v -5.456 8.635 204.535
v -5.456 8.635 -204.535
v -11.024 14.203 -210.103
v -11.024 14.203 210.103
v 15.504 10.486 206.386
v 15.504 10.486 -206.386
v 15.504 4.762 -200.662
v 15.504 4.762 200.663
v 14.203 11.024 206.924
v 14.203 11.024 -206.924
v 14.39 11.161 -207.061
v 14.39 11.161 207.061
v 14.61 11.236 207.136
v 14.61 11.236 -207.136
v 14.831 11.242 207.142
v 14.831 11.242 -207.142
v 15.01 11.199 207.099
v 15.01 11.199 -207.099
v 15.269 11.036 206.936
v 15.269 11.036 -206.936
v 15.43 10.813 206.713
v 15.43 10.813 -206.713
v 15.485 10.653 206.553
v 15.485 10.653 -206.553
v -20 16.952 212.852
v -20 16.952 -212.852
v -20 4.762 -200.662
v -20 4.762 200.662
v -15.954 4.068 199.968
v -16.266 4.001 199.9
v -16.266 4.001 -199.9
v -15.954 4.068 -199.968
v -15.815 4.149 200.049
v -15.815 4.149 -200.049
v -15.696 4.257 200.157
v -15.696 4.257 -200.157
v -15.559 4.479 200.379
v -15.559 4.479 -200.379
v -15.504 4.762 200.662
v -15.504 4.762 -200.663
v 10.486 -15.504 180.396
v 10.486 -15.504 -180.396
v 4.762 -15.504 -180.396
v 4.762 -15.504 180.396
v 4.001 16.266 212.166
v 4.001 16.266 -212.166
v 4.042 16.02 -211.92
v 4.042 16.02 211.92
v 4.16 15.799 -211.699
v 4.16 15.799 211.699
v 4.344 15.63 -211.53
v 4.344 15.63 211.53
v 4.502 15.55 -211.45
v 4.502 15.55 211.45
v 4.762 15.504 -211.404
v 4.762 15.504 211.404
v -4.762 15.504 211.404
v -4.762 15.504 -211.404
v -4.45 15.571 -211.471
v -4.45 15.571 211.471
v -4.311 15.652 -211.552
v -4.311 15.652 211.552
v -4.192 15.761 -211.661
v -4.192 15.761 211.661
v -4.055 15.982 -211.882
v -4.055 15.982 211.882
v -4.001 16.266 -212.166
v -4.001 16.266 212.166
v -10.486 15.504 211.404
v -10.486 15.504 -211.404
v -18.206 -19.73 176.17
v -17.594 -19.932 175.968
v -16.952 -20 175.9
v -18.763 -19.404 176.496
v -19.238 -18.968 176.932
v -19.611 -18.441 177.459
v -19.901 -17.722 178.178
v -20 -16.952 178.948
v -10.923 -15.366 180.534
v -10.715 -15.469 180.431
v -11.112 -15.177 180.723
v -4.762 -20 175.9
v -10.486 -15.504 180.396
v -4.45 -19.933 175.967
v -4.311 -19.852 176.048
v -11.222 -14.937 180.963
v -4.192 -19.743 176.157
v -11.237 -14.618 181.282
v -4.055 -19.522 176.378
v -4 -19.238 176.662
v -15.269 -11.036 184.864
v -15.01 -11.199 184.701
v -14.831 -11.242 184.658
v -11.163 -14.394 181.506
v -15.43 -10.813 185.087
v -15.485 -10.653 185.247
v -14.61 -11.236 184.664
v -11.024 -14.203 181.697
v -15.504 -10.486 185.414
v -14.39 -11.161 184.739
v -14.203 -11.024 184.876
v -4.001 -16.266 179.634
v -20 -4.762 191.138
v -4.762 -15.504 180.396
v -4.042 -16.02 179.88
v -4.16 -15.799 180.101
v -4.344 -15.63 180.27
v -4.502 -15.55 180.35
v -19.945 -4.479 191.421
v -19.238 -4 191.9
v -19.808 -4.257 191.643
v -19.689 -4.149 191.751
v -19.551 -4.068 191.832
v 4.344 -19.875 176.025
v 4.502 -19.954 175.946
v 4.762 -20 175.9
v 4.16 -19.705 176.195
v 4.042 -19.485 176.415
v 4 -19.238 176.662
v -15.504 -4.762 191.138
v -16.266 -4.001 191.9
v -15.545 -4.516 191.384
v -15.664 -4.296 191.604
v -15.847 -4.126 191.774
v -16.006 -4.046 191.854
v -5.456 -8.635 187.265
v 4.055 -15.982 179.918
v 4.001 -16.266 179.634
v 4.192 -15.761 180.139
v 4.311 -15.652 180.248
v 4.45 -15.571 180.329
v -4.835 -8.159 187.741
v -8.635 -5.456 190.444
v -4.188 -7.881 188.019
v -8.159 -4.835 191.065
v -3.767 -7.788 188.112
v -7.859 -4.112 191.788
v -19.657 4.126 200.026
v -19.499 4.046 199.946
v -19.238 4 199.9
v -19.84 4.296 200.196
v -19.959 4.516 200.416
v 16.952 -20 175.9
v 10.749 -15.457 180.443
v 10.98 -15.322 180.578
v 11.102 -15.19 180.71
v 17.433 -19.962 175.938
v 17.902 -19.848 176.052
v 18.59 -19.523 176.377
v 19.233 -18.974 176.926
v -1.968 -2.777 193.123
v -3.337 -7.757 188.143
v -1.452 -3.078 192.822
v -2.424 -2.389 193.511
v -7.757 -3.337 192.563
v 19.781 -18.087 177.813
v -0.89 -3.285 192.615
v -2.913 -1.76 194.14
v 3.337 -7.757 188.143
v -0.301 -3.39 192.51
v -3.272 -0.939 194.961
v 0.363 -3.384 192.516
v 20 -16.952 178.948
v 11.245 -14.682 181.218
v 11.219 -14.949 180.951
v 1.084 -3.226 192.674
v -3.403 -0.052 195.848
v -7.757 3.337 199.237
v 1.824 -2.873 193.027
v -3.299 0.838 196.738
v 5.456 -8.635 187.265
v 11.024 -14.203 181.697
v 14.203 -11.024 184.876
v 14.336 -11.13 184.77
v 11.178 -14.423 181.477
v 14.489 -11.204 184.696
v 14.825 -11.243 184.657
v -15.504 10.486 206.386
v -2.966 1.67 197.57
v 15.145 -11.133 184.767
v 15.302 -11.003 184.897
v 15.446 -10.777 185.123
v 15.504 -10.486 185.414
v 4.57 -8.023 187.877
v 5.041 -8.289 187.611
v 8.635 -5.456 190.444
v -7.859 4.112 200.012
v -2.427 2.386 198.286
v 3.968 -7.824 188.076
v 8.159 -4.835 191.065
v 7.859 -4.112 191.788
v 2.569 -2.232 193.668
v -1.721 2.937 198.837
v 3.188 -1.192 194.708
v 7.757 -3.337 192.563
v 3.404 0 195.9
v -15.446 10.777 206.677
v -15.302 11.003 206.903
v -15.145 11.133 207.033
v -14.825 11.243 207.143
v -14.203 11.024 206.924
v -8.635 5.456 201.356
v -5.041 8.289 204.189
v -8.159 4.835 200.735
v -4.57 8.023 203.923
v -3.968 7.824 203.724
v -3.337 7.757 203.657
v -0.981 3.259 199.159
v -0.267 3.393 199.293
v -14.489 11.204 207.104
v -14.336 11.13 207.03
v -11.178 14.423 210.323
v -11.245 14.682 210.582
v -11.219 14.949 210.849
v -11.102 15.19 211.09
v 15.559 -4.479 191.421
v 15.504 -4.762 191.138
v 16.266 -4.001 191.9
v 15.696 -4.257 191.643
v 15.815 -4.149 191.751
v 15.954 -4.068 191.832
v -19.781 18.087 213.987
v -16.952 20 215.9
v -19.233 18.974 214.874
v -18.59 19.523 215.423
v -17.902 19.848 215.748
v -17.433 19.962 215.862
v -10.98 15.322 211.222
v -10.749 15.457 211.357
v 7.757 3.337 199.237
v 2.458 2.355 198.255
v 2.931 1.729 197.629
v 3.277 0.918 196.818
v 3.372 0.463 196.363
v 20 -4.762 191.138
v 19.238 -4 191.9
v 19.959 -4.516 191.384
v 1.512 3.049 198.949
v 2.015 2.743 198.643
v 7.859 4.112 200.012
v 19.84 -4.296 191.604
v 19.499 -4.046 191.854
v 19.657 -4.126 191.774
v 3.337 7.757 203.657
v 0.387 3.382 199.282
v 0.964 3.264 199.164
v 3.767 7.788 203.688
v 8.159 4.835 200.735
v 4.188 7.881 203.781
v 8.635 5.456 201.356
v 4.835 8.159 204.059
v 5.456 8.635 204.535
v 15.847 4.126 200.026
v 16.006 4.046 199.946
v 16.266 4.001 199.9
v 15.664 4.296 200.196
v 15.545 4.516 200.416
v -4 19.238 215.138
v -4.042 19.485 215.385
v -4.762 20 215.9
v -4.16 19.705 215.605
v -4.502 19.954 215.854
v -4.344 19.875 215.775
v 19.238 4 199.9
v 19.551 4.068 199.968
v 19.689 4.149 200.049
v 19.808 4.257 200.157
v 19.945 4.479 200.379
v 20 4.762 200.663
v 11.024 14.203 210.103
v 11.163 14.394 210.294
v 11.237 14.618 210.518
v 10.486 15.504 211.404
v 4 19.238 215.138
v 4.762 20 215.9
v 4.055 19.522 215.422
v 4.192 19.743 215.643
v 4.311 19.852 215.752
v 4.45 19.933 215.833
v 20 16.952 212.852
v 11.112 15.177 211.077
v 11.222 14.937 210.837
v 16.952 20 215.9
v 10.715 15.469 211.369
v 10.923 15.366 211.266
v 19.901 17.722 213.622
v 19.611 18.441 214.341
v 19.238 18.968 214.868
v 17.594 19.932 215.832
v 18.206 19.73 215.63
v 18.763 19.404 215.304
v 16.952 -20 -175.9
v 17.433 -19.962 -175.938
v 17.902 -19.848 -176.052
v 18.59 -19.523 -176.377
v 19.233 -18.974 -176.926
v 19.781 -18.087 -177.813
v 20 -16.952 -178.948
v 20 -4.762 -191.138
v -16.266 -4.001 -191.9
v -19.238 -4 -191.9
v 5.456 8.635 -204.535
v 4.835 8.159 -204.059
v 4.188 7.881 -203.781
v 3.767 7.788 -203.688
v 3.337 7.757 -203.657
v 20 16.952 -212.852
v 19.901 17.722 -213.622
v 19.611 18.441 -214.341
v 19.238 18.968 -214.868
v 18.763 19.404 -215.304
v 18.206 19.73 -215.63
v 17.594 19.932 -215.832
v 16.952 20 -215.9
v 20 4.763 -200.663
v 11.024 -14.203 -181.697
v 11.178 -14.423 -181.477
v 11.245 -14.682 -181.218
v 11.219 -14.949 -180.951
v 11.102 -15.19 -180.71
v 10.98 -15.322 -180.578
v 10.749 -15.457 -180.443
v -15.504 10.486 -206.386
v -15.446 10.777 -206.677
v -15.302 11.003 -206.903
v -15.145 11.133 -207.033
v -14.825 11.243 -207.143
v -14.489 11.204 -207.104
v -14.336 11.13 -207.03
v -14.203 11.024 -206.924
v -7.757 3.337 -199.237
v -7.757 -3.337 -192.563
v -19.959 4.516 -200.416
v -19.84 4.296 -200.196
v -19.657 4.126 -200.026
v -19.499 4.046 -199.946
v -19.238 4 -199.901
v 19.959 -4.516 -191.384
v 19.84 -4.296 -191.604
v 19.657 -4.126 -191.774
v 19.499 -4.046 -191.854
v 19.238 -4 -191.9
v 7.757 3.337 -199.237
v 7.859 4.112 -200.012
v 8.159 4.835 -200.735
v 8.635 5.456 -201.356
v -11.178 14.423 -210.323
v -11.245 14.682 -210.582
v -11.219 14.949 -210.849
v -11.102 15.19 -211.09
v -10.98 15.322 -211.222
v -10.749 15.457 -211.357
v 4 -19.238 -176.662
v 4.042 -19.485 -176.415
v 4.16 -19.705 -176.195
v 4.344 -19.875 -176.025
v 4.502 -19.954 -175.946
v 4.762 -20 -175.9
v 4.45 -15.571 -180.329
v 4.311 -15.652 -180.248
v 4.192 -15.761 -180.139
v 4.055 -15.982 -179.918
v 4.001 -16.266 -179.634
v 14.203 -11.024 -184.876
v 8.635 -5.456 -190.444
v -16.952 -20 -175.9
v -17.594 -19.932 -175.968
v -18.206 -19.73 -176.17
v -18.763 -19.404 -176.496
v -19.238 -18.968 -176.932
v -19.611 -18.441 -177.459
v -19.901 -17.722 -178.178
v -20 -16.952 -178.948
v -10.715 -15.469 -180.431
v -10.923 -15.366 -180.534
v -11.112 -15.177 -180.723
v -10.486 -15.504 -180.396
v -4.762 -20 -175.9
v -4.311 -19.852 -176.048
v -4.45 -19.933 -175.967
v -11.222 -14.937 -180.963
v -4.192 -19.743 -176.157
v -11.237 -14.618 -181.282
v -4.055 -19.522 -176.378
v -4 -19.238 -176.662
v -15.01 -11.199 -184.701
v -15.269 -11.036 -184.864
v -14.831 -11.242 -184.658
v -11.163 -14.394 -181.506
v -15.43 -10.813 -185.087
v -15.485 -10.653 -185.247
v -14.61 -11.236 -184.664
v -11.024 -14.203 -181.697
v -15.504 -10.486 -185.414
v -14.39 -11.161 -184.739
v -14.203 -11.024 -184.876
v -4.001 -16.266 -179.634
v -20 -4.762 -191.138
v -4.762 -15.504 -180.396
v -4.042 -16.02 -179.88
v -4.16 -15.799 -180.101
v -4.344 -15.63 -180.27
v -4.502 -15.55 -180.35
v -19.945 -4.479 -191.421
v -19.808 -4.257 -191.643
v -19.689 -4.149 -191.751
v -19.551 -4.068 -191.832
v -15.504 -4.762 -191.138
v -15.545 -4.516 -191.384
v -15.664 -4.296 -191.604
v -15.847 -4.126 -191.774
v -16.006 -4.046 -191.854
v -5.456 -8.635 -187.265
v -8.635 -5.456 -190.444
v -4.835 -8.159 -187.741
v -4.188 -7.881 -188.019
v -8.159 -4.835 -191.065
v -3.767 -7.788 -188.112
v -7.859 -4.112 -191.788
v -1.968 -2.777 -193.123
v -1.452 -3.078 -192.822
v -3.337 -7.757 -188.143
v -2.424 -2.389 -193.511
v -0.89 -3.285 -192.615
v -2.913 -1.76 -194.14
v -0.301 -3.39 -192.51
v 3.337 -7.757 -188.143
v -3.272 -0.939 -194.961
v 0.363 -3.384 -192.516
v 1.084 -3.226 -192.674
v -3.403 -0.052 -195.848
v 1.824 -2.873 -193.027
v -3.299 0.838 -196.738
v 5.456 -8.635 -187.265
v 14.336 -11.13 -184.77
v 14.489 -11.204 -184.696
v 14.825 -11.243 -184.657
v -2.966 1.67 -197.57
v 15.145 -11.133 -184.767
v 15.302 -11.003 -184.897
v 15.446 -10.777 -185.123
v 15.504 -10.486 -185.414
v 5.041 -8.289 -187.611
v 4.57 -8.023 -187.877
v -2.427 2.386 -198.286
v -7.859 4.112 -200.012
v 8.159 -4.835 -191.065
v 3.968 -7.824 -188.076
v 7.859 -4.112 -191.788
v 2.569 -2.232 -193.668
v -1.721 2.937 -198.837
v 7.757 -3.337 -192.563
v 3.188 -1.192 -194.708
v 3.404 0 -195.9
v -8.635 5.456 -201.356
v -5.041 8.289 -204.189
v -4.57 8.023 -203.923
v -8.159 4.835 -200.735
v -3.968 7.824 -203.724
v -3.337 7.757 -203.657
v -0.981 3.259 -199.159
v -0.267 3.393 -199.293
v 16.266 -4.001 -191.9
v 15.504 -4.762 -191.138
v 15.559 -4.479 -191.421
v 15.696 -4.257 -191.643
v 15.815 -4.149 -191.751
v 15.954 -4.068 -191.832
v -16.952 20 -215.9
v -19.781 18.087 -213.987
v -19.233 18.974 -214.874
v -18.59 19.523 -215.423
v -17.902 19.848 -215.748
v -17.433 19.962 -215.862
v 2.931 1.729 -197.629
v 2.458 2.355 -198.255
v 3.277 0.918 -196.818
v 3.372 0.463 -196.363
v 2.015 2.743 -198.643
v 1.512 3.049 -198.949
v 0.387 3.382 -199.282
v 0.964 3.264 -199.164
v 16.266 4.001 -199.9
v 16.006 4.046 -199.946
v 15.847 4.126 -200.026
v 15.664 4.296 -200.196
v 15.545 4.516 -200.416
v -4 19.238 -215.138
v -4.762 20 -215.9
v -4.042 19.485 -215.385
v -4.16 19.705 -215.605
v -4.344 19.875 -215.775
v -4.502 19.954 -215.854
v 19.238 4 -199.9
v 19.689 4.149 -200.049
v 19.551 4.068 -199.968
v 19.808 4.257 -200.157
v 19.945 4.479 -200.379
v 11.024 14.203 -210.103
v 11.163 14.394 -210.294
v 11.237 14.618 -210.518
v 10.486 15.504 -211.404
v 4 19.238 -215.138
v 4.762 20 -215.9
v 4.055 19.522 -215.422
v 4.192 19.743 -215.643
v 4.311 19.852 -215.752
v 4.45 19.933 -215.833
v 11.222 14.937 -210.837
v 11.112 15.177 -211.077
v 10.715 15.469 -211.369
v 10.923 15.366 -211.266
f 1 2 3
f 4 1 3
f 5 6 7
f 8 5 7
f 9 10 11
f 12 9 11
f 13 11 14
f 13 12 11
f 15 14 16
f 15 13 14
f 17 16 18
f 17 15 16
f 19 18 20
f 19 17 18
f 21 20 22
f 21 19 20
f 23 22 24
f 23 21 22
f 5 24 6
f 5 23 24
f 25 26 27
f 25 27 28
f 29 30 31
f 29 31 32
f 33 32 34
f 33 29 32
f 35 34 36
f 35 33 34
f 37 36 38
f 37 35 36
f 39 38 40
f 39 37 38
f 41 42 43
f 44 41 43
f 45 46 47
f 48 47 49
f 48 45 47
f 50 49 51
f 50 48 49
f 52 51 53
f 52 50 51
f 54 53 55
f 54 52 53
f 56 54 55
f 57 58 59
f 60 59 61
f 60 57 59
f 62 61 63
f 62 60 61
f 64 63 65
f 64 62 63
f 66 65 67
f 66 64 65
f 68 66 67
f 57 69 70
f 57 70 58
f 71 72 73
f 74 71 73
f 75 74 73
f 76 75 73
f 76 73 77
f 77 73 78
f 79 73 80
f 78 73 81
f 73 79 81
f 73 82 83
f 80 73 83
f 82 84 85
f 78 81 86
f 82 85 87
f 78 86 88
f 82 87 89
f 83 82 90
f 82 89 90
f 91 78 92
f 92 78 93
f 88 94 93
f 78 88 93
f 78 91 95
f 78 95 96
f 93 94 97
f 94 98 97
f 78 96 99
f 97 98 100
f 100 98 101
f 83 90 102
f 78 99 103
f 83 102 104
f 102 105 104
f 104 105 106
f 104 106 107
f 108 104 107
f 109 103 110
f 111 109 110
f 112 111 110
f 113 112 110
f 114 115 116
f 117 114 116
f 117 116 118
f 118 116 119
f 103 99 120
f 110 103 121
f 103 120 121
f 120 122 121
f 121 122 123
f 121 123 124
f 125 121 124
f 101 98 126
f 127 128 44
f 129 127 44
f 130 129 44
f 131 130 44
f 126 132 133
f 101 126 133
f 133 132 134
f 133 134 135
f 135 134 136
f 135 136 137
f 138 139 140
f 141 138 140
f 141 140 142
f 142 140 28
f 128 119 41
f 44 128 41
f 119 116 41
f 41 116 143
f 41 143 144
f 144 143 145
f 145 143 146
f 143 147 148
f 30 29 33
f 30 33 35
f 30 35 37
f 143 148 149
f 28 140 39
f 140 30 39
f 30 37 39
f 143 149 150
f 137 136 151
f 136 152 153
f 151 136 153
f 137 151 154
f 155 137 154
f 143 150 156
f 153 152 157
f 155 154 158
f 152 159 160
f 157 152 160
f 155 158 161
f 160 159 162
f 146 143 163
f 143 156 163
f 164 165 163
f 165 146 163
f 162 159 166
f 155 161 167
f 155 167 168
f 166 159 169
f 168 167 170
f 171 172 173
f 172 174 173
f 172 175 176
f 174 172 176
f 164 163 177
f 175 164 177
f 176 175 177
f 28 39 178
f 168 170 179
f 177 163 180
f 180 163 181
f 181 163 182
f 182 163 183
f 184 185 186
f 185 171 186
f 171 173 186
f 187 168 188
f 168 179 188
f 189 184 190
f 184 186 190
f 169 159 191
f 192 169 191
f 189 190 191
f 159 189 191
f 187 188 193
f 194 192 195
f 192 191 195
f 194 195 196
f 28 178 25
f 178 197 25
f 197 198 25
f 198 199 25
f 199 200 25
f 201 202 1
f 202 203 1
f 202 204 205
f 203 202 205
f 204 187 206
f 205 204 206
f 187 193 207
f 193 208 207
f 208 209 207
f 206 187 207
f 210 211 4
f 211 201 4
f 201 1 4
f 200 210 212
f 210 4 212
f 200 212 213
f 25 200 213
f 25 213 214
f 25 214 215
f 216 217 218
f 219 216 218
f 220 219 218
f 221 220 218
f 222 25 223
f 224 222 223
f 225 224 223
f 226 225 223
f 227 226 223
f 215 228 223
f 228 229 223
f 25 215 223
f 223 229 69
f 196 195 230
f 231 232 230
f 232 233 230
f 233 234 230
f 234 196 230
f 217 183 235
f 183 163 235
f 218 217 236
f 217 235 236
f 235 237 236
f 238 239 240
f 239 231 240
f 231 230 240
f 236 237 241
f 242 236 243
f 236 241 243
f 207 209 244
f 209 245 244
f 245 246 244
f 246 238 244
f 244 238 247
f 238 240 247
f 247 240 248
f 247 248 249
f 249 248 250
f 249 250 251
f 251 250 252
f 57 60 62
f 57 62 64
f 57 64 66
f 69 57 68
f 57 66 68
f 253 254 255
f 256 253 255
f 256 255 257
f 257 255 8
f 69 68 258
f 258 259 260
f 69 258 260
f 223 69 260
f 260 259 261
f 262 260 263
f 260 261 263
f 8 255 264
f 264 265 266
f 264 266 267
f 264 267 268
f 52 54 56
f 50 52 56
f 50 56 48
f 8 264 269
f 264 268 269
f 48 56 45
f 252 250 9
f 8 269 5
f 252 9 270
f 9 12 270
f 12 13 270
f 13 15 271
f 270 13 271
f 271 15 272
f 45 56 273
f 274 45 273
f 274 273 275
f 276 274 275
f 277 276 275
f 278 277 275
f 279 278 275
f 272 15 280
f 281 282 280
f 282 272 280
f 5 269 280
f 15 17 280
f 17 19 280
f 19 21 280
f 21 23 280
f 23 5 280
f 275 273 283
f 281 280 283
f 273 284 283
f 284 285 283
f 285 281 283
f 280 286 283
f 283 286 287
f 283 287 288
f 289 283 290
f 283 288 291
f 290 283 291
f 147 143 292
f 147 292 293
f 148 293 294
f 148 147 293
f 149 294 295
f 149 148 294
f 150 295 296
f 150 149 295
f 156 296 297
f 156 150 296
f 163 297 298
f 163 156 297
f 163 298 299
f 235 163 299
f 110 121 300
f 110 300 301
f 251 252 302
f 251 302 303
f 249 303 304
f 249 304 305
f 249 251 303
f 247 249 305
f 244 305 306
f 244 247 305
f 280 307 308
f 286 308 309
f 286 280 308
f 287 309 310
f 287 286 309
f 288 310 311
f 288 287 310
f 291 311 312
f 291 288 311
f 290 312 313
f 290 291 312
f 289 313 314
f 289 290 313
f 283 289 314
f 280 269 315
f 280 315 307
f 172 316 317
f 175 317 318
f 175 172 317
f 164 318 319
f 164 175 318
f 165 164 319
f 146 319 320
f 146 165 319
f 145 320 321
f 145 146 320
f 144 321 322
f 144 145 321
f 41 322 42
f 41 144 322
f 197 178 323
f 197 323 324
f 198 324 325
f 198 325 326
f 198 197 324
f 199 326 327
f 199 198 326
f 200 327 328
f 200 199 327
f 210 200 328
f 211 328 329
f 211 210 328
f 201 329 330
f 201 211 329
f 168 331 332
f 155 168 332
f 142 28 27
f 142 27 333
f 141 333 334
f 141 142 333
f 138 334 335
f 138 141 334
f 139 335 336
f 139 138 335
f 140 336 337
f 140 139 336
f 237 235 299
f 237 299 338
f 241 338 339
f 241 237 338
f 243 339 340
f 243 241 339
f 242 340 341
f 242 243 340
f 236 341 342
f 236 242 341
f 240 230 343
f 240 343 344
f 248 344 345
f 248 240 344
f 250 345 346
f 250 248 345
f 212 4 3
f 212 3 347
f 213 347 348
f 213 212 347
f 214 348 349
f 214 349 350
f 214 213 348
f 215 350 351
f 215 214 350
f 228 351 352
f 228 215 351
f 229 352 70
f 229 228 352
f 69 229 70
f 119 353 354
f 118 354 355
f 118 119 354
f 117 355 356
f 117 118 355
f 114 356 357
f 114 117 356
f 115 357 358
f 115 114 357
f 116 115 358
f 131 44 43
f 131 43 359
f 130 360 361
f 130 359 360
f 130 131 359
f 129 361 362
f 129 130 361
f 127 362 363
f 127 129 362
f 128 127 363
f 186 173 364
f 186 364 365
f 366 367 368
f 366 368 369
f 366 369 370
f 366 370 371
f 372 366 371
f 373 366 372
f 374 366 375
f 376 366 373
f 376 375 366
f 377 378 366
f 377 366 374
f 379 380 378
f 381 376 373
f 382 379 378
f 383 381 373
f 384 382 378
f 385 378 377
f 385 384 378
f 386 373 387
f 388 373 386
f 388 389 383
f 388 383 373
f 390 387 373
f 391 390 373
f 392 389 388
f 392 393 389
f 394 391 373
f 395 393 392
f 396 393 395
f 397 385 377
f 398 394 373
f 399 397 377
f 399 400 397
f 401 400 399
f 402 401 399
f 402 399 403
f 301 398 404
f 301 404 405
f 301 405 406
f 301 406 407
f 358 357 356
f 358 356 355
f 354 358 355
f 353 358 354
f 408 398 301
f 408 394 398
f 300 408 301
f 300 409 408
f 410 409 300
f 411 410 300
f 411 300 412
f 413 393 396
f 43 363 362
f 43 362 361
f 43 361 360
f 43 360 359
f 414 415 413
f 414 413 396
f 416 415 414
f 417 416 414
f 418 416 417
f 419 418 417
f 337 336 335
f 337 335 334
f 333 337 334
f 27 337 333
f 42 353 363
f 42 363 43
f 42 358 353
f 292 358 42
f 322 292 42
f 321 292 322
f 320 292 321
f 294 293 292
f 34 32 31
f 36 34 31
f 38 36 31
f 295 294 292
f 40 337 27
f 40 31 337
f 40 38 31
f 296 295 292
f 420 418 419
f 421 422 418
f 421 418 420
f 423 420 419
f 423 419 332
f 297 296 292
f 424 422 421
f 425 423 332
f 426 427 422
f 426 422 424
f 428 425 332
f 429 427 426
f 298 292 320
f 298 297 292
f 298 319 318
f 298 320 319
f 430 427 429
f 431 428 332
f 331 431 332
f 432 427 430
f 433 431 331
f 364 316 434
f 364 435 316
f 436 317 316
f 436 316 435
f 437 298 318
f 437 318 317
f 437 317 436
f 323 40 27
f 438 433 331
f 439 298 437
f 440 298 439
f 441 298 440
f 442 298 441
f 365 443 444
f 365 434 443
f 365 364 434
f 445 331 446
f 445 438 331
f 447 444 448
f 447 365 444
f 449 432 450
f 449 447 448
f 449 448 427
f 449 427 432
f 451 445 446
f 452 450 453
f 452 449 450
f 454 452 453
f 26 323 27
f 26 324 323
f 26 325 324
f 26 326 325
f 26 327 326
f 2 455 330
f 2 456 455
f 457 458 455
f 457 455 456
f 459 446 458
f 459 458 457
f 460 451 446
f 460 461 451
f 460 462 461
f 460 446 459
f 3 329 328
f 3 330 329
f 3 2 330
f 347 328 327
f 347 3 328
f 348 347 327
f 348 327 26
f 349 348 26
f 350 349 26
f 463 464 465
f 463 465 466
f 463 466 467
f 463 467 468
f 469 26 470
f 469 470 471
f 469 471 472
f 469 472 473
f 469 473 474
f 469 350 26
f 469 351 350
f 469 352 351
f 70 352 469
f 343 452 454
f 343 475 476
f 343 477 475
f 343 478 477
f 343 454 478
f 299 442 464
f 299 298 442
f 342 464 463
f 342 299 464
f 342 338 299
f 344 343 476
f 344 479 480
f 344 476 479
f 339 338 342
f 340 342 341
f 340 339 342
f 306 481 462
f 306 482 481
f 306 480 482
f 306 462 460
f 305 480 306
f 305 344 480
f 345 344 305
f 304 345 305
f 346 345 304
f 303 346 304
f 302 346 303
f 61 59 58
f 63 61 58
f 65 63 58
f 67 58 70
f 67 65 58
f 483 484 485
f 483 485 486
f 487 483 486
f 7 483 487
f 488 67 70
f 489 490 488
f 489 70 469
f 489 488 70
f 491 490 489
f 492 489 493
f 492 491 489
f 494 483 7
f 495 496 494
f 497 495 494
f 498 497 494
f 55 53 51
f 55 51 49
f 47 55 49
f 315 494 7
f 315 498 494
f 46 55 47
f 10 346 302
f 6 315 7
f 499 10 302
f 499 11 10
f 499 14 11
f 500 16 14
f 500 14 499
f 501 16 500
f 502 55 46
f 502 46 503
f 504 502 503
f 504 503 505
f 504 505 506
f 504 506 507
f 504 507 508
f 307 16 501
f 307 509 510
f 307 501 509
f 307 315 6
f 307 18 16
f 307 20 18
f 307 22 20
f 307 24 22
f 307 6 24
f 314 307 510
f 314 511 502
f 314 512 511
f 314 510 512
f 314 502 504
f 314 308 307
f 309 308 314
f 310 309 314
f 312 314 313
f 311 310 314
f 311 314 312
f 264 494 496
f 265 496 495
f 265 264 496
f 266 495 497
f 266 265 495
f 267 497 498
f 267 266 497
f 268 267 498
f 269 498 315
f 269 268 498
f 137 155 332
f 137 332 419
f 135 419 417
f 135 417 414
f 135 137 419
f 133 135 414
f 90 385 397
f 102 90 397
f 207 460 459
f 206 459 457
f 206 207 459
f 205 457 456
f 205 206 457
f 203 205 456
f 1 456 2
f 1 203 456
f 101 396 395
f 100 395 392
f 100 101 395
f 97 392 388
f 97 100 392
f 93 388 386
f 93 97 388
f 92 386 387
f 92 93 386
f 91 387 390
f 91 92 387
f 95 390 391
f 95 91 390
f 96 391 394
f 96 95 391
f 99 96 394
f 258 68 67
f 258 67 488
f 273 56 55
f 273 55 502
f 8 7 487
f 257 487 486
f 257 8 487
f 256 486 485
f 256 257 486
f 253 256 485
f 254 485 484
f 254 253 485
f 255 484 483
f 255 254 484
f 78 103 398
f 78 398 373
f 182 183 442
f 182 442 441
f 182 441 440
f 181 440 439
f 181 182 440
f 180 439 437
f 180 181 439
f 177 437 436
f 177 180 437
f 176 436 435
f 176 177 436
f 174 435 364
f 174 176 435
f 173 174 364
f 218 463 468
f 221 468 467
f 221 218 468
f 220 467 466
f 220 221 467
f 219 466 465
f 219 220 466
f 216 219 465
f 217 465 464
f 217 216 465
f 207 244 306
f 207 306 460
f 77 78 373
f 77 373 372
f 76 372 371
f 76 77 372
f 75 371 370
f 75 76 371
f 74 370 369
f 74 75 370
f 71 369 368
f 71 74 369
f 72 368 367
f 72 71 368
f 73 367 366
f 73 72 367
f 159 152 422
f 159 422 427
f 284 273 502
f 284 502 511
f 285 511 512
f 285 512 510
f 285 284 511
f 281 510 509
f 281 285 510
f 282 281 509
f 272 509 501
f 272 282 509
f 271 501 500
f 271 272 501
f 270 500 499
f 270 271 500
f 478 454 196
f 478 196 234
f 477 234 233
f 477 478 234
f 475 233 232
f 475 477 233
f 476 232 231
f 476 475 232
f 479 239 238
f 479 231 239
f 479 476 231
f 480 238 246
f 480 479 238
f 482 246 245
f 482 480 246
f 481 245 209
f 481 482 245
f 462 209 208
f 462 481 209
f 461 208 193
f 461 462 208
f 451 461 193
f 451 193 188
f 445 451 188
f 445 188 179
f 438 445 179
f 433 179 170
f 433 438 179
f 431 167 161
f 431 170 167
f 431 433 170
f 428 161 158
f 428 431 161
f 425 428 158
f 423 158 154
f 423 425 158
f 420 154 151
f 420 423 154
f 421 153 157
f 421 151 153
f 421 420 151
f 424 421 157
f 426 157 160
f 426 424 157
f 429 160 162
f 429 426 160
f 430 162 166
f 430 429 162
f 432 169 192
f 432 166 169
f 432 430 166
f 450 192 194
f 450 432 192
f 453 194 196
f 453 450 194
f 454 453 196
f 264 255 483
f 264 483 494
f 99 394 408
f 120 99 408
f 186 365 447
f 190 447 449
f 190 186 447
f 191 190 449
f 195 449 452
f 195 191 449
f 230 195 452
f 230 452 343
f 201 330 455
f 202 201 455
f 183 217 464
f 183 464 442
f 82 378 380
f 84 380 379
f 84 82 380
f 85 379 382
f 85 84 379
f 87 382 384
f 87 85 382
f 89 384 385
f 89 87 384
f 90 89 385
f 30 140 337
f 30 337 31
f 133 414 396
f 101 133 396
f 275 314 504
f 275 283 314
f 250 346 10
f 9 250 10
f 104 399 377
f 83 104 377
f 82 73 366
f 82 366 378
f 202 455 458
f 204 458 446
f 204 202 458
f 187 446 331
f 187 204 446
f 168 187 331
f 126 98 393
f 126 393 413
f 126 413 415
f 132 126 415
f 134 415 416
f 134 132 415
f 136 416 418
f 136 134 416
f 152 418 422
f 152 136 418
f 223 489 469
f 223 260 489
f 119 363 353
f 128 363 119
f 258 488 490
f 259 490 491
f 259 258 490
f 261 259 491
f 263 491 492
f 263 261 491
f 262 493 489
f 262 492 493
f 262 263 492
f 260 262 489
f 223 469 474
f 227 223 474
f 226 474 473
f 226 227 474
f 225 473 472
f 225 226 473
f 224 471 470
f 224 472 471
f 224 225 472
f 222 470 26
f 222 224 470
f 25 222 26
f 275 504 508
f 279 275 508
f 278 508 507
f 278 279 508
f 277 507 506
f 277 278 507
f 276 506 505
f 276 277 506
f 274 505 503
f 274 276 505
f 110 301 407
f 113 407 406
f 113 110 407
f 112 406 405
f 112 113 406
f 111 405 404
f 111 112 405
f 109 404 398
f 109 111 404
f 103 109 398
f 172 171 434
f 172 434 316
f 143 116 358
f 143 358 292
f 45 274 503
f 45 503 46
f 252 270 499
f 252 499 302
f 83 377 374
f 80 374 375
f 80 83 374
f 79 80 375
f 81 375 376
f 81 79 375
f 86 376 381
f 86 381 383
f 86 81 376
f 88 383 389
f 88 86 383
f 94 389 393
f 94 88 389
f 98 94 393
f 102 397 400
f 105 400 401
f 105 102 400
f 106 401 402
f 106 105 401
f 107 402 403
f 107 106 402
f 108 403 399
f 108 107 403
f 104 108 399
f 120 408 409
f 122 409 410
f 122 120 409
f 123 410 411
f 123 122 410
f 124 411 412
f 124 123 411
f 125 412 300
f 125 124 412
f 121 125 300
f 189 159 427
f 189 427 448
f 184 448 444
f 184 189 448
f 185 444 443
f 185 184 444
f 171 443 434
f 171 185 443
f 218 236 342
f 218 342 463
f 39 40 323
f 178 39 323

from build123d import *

# Parameters (mm, degrees)
SKETCH1_R          = 3.4036
EXTRUDE1_DEPTH     = 215.9
CUT_EXTRUDE1_DEPTH = 436.22027791
CUT_EXTRUDE2_DEPTH = 3.048
CUT_EXTRUDE5_REACH = 437.22
CUT_EXTRUDE6_DEPTH = 3.048


with BuildPart() as part:
    # Sketch1 → Extrude1 (new, symmetric)
    with BuildSketch(Plane.XY):
        with BuildLine():
            Line((-20, 16.952), (-20, 4.7625))
            ThreePointArc((-20, 4.7625), (-19.776815367, 4.223684633), (-19.238, 4.0005))
            Line((-19.238, 4.0005), (-16.2662, 4.0005))
            ThreePointArc((-16.2662, 4.0005), (-15.727384633, 4.223684633), (-15.5042, 4.7625))
            Line((-15.5042, 4.7625), (-15.5042, 10.485558599))
            ThreePointArc((-15.5042, 10.485558599), (-15.033804775, 11.189554802), (-14.203384633, 11.024373966))
            Line((-14.203384633, 11.024373966), (-8.635059555, 5.456048889))
            ThreePointArc((-8.635059555, 5.456048889), (-7.985348265, 4.483687227), (-7.7572, 3.336708444))
            Line((-7.7572, 3.336708444), (-7.7572, -3.336708444))
            ThreePointArc((-7.7572, -3.336708444), (-7.985348265, -4.483687227), (-8.635059555, -5.456048889))
            Line((-8.635059555, -5.456048889), (-14.203384633, -11.024373966))
            ThreePointArc((-14.203384633, -11.024373966), (-15.033804775, -11.189554802), (-15.5042, -10.485558599))
            Line((-15.5042, -10.485558599), (-15.5042, -4.7625))
            ThreePointArc((-15.5042, -4.7625), (-15.727384633, -4.223684633), (-16.2662, -4.0005))
            Line((-16.2662, -4.0005), (-19.238, -4.0005))
            ThreePointArc((-19.238, -4.0005), (-19.776815367, -4.223684633), (-20, -4.7625))
            Line((-20, -4.7625), (-20, -16.952))
            ThreePointArc((-20, -16.952), (-19.107261469, -19.107261469), (-16.952, -20))
            Line((-16.952, -20), (-4.7625, -20))
            ThreePointArc((-4.7625, -20), (-4.223684633, -19.776815367), (-4.0005, -19.238))
            Line((-4.0005, -19.238), (-4.0005, -16.2662))
            ThreePointArc((-4.0005, -16.2662), (-4.223684633, -15.727384633), (-4.7625, -15.5042))
            Line((-4.7625, -15.5042), (-10.485558599, -15.5042))
            ThreePointArc((-10.485558599, -15.5042), (-11.189554802, -15.033804775), (-11.024373966, -14.203384633))
            Line((-11.024373966, -14.203384633), (-5.456048889, -8.635059555))
            ThreePointArc((-5.456048889, -8.635059555), (-4.483687227, -7.985348265), (-3.336708444, -7.7572))
            Line((-3.336708444, -7.7572), (3.336708444, -7.7572))
            ThreePointArc((3.336708444, -7.7572), (4.483687227, -7.985348265), (5.456048889, -8.635059555))
            Line((5.456048889, -8.635059555), (11.024373966, -14.203384633))
            ThreePointArc((11.024373966, -14.203384633), (11.189554802, -15.033804775), (10.485558599, -15.5042))
            Line((10.485558599, -15.5042), (4.7625, -15.5042))
            ThreePointArc((4.7625, -15.5042), (4.223684633, -15.727384633), (4.0005, -16.2662))
            Line((4.0005, -16.2662), (4.0005, -19.238))
            ThreePointArc((4.0005, -19.238), (4.223684633, -19.776815367), (4.7625, -20))
            Line((4.7625, -20), (16.952, -20))
            ThreePointArc((16.952, -20), (19.107261469, -19.107261469), (20, -16.952))
            Line((20, -16.952), (20, -4.7625))
            ThreePointArc((20, -4.7625), (19.776815367, -4.223684633), (19.238, -4.0005))
            Line((19.238, -4.0005), (16.2662, -4.0005))
            ThreePointArc((16.2662, -4.0005), (15.727384633, -4.223684633), (15.5042, -4.7625))
            Line((15.5042, -4.7625), (15.5042, -10.485558599))
            ThreePointArc((15.5042, -10.485558599), (15.033804775, -11.189554802), (14.203384633, -11.024373966))
            Line((14.203384633, -11.024373966), (8.635059555, -5.456048889))
            ThreePointArc((8.635059555, -5.456048889), (7.985348265, -4.483687227), (7.7572, -3.336708444))
            Line((7.7572, -3.336708444), (7.7572, 3.336708444))
            ThreePointArc((7.7572, 3.336708444), (7.985348265, 4.483687227), (8.635059555, 5.456048889))
            Line((8.635059555, 5.456048889), (14.203384633, 11.024373966))
            ThreePointArc((14.203384633, 11.024373966), (15.033804775, 11.189554802), (15.5042, 10.485558599))
            Line((15.5042, 10.485558599), (15.5042, 4.7625))
            ThreePointArc((15.5042, 4.7625), (15.727384633, 4.223684633), (16.2662, 4.0005))
            Line((16.2662, 4.0005), (19.238, 4.0005))
            ThreePointArc((19.238, 4.0005), (19.776815367, 4.223684633), (20, 4.7625))
            Line((20, 4.7625), (20, 16.952))
            ThreePointArc((20, 16.952), (19.107261469, 19.107261469), (16.952, 20))
            Line((16.952, 20), (4.7625, 20))
            ThreePointArc((4.7625, 20), (4.223684633, 19.776815367), (4.0005, 19.238))
            Line((4.0005, 19.238), (4.0005, 16.2662))
            ThreePointArc((4.0005, 16.2662), (4.223684633, 15.727384633), (4.7625, 15.5042))
            Line((4.7625, 15.5042), (10.485558599, 15.5042))
            ThreePointArc((10.485558599, 15.5042), (11.189554802, 15.033804775), (11.024373966, 14.203384633))
            Line((11.024373966, 14.203384633), (5.456048889, 8.635059555))
            ThreePointArc((5.456048889, 8.635059555), (4.483687227, 7.985348265), (3.336708444, 7.7572))
            Line((3.336708444, 7.7572), (-3.336708444, 7.7572))
            ThreePointArc((-3.336708444, 7.7572), (-4.483687227, 7.985348265), (-5.456048889, 8.635059555))
            Line((-5.456048889, 8.635059555), (-11.024373966, 14.203384633))
            ThreePointArc((-11.024373966, 14.203384633), (-11.189554802, 15.033804775), (-10.485558599, 15.5042))
            Line((-10.485558599, 15.5042), (-4.7625, 15.5042))
            ThreePointArc((-4.7625, 15.5042), (-4.223684633, 15.727384633), (-4.0005, 16.2662))
            Line((-4.0005, 16.2662), (-4.0005, 19.238))
            ThreePointArc((-4.0005, 19.238), (-4.223684633, 19.776815367), (-4.7625, 20))
            Line((-4.7625, 20), (-16.952, 20))
            ThreePointArc((-16.952, 20), (-19.107261469, 19.107261469), (-20, 16.952))
        make_face()
        Circle(SKETCH1_R, mode=Mode.SUBTRACT)
    extrude(amount=EXTRUDE1_DEPTH, both=True)

    # Sketch3 → Cut-Extrude1 (cut, through all)
    with BuildSketch(Plane(origin=(-16.952, 20, 215.9), x_dir=(0, 0, 1), z_dir=(-1, 0, 0))):
        Polygon((0, 0), (-40, -40), (0, -40), align=None)
    extrude(amount=-CUT_EXTRUDE1_DEPTH, mode=Mode.SUBTRACT)

    # Sketch4 → Cut-Extrude2 (cut)
    with BuildSketch(Plane(origin=(-16.952, 0, 0), x_dir=(0, 0, -1), z_dir=(1, 0, 0))):
        Polygon((-215.9, 20), (-215.9, -20), (-175.9, -20), align=None)
    extrude(amount=-CUT_EXTRUDE2_DEPTH, mode=Mode.SUBTRACT)

    # Cut-Extrude5: up to this face of the body (flat: up to its plane)
    cut_extrude5_end = Plane(part.part.faces().sort_by_distance((20, 10.886545588, -4.556727206))[0])
    # Sketch9 → Cut-Extrude5 (cut, up to the picked face)
    with BuildSketch(Plane(origin=(-16.952, 20, 215.9), x_dir=(0, 0, 1), z_dir=(-1, 0, 0)), mode=Mode.PRIVATE) as cut_extrude5_sk1:
        Polygon((-431.8, 0), (-391.8, -40), (-431.8, -40), align=None)
    cut_extrude5_tool1 = split(extrude(cut_extrude5_sk1.sketch, amount=-CUT_EXTRUDE5_REACH, mode=Mode.PRIVATE), bisect_by=cut_extrude5_end, keep=Keep.BOTH, mode=Mode.PRIVATE)
    add(cut_extrude5_tool1.solids().sort_by(Axis((-16.952, -6.666667, -202.566667), (1, 0, 0)))[0], mode=Mode.SUBTRACT)

    # Sketch11 → Cut-Extrude6 (cut)
    with BuildSketch(Plane(origin=(-16.952, 0, 0), x_dir=(0, 0, -1), z_dir=(1, 0, 0))):
        Polygon((175.9, -20), (215.9, 20), (215.9, -20), align=None)
    extrude(amount=-CUT_EXTRUDE6_DEPTH, mode=Mode.SUBTRACT)


solid = part.part
